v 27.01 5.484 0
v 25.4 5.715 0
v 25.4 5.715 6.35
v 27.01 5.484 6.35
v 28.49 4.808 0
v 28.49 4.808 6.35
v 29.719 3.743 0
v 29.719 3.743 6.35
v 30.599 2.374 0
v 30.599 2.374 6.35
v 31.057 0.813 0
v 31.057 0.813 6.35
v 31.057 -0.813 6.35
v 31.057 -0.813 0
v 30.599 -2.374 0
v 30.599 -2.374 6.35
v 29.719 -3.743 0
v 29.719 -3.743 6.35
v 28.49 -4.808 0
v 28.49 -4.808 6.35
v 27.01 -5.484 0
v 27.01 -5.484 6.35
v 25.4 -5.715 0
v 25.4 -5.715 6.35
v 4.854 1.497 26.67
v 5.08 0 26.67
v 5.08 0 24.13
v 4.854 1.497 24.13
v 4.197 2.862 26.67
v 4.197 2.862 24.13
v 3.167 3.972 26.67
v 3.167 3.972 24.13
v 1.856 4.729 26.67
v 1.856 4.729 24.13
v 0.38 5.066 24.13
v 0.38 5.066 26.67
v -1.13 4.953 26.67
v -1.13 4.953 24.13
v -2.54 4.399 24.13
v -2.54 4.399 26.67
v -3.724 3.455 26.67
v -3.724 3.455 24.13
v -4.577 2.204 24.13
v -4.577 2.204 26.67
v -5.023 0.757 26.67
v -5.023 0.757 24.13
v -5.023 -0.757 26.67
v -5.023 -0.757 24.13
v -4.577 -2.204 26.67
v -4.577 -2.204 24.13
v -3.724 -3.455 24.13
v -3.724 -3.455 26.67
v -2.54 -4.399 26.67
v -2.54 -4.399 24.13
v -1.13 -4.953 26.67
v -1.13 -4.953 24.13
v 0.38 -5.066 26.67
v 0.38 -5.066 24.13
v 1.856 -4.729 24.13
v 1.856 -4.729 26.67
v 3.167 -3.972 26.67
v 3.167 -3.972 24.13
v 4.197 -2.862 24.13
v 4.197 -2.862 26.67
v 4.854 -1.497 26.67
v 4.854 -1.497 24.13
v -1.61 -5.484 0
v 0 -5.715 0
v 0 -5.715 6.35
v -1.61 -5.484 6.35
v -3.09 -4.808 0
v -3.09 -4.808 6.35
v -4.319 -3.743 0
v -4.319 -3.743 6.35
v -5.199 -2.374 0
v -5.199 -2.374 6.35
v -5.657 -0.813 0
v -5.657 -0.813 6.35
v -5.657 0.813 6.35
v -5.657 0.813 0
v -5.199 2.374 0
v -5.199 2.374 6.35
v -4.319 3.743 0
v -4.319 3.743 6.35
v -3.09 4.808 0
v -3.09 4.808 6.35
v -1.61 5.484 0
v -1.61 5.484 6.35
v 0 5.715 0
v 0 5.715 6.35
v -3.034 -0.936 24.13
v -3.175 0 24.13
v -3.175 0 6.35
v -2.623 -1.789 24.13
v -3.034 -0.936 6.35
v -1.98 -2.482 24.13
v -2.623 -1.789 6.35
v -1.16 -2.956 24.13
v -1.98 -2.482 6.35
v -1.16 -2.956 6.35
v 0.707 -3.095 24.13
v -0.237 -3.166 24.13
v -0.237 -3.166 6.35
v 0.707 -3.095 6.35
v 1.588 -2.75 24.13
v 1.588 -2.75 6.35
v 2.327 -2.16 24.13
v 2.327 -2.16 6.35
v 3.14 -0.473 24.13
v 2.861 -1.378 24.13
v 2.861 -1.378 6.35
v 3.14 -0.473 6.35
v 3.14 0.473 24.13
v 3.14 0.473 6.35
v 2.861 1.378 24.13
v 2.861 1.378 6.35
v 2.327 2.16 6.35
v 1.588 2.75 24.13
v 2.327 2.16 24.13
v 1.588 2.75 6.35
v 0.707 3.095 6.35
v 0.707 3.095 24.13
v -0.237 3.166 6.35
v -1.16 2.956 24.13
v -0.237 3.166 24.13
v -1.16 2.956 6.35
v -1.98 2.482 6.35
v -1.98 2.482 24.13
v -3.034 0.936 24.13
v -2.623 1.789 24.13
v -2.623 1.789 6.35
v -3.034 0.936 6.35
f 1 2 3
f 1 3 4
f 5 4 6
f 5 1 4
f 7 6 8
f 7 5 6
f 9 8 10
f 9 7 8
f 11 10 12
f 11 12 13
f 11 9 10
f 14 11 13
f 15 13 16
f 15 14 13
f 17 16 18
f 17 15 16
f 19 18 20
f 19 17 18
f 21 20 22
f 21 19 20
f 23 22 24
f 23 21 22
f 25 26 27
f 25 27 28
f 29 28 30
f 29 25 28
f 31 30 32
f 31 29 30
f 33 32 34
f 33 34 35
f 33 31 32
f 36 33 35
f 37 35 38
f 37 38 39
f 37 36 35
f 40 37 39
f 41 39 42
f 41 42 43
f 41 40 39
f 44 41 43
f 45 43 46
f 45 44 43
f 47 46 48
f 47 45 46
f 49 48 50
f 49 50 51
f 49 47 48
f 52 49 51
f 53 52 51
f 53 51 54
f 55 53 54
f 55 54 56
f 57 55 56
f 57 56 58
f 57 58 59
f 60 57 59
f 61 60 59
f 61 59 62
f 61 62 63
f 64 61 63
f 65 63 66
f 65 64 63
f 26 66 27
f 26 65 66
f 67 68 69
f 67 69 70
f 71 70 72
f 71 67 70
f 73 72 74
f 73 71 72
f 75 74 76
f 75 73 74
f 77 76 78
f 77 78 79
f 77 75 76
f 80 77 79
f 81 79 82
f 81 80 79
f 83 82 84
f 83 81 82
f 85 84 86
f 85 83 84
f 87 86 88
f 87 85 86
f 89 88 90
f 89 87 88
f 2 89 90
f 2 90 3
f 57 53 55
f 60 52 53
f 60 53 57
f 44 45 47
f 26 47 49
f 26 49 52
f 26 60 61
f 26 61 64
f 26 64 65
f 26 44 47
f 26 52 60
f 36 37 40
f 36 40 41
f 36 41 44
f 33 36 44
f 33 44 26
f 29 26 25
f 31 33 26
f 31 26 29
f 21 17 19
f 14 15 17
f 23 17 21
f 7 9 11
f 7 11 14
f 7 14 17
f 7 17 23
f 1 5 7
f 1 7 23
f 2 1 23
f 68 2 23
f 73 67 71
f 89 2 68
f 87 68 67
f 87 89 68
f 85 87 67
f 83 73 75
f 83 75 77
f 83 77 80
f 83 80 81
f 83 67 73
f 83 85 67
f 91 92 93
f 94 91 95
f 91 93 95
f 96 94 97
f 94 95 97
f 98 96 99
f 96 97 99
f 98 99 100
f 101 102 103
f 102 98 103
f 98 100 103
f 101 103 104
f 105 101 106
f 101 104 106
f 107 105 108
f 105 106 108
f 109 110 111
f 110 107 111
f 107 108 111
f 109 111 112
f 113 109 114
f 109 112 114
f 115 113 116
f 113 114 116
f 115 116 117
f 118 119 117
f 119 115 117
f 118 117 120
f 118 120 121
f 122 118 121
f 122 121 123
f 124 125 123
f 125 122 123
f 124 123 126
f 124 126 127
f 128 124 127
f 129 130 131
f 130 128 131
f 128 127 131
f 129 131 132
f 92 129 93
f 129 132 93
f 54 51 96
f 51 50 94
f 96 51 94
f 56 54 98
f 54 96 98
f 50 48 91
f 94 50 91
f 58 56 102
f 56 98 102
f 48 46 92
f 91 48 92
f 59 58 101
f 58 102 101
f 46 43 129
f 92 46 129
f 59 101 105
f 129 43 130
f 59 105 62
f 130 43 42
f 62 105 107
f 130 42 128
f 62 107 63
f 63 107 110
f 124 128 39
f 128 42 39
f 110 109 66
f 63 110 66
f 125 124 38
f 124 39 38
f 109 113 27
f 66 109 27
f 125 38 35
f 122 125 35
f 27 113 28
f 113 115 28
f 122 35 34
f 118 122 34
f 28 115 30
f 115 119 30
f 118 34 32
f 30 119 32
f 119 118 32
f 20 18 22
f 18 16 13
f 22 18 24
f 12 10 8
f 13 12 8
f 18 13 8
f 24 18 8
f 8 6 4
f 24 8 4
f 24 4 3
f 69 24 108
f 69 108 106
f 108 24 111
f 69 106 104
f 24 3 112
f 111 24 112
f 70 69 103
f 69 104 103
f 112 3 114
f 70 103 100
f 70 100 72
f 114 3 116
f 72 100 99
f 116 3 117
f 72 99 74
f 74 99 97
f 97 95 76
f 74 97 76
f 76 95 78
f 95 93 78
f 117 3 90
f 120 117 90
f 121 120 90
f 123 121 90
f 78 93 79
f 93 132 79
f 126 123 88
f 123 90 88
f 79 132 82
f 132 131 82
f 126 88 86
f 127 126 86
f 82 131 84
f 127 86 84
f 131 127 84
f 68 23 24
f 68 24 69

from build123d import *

# Parameters (mm, degrees)
BOSS_EXTRUDE1_DEPTH = 6.35
SKETCH2_R           = 3.175
BOSS_EXTRUDE2_DEPTH = 20.32
SKETCH3_R           = 5.08
BOSS_EXTRUDE3_DEPTH = 2.54


with BuildPart() as part:
    # Sketch1 → Boss-Extrude1 (new body)
    with BuildSketch(Plane.XY):
        with BuildLine():
            Line((0, 5.715), (25.4, 5.715))
            ThreePointArc((25.4, 5.715), (31.115, 0), (25.4, -5.715))
            Line((25.4, -5.715), (0, -5.715))
            ThreePointArc((0, -5.715), (-5.715, 0), (0, 5.715))
        make_face()
    extrude(amount=BOSS_EXTRUDE1_DEPTH)

    # Sketch2 → Boss-Extrude2 (add)
    with BuildSketch(Plane.XY.offset(6.35)):
        with Locations(Location((0, 0, 0), (0, 0, 180))):
            Circle(SKETCH2_R)
    extrude(amount=BOSS_EXTRUDE2_DEPTH)

    # Sketch3 → Boss-Extrude3 (add)
    with BuildSketch(Plane.XY.offset(26.67)):
        Circle(SKETCH3_R)
    extrude(amount=-BOSS_EXTRUDE3_DEPTH)


solid = part.part
